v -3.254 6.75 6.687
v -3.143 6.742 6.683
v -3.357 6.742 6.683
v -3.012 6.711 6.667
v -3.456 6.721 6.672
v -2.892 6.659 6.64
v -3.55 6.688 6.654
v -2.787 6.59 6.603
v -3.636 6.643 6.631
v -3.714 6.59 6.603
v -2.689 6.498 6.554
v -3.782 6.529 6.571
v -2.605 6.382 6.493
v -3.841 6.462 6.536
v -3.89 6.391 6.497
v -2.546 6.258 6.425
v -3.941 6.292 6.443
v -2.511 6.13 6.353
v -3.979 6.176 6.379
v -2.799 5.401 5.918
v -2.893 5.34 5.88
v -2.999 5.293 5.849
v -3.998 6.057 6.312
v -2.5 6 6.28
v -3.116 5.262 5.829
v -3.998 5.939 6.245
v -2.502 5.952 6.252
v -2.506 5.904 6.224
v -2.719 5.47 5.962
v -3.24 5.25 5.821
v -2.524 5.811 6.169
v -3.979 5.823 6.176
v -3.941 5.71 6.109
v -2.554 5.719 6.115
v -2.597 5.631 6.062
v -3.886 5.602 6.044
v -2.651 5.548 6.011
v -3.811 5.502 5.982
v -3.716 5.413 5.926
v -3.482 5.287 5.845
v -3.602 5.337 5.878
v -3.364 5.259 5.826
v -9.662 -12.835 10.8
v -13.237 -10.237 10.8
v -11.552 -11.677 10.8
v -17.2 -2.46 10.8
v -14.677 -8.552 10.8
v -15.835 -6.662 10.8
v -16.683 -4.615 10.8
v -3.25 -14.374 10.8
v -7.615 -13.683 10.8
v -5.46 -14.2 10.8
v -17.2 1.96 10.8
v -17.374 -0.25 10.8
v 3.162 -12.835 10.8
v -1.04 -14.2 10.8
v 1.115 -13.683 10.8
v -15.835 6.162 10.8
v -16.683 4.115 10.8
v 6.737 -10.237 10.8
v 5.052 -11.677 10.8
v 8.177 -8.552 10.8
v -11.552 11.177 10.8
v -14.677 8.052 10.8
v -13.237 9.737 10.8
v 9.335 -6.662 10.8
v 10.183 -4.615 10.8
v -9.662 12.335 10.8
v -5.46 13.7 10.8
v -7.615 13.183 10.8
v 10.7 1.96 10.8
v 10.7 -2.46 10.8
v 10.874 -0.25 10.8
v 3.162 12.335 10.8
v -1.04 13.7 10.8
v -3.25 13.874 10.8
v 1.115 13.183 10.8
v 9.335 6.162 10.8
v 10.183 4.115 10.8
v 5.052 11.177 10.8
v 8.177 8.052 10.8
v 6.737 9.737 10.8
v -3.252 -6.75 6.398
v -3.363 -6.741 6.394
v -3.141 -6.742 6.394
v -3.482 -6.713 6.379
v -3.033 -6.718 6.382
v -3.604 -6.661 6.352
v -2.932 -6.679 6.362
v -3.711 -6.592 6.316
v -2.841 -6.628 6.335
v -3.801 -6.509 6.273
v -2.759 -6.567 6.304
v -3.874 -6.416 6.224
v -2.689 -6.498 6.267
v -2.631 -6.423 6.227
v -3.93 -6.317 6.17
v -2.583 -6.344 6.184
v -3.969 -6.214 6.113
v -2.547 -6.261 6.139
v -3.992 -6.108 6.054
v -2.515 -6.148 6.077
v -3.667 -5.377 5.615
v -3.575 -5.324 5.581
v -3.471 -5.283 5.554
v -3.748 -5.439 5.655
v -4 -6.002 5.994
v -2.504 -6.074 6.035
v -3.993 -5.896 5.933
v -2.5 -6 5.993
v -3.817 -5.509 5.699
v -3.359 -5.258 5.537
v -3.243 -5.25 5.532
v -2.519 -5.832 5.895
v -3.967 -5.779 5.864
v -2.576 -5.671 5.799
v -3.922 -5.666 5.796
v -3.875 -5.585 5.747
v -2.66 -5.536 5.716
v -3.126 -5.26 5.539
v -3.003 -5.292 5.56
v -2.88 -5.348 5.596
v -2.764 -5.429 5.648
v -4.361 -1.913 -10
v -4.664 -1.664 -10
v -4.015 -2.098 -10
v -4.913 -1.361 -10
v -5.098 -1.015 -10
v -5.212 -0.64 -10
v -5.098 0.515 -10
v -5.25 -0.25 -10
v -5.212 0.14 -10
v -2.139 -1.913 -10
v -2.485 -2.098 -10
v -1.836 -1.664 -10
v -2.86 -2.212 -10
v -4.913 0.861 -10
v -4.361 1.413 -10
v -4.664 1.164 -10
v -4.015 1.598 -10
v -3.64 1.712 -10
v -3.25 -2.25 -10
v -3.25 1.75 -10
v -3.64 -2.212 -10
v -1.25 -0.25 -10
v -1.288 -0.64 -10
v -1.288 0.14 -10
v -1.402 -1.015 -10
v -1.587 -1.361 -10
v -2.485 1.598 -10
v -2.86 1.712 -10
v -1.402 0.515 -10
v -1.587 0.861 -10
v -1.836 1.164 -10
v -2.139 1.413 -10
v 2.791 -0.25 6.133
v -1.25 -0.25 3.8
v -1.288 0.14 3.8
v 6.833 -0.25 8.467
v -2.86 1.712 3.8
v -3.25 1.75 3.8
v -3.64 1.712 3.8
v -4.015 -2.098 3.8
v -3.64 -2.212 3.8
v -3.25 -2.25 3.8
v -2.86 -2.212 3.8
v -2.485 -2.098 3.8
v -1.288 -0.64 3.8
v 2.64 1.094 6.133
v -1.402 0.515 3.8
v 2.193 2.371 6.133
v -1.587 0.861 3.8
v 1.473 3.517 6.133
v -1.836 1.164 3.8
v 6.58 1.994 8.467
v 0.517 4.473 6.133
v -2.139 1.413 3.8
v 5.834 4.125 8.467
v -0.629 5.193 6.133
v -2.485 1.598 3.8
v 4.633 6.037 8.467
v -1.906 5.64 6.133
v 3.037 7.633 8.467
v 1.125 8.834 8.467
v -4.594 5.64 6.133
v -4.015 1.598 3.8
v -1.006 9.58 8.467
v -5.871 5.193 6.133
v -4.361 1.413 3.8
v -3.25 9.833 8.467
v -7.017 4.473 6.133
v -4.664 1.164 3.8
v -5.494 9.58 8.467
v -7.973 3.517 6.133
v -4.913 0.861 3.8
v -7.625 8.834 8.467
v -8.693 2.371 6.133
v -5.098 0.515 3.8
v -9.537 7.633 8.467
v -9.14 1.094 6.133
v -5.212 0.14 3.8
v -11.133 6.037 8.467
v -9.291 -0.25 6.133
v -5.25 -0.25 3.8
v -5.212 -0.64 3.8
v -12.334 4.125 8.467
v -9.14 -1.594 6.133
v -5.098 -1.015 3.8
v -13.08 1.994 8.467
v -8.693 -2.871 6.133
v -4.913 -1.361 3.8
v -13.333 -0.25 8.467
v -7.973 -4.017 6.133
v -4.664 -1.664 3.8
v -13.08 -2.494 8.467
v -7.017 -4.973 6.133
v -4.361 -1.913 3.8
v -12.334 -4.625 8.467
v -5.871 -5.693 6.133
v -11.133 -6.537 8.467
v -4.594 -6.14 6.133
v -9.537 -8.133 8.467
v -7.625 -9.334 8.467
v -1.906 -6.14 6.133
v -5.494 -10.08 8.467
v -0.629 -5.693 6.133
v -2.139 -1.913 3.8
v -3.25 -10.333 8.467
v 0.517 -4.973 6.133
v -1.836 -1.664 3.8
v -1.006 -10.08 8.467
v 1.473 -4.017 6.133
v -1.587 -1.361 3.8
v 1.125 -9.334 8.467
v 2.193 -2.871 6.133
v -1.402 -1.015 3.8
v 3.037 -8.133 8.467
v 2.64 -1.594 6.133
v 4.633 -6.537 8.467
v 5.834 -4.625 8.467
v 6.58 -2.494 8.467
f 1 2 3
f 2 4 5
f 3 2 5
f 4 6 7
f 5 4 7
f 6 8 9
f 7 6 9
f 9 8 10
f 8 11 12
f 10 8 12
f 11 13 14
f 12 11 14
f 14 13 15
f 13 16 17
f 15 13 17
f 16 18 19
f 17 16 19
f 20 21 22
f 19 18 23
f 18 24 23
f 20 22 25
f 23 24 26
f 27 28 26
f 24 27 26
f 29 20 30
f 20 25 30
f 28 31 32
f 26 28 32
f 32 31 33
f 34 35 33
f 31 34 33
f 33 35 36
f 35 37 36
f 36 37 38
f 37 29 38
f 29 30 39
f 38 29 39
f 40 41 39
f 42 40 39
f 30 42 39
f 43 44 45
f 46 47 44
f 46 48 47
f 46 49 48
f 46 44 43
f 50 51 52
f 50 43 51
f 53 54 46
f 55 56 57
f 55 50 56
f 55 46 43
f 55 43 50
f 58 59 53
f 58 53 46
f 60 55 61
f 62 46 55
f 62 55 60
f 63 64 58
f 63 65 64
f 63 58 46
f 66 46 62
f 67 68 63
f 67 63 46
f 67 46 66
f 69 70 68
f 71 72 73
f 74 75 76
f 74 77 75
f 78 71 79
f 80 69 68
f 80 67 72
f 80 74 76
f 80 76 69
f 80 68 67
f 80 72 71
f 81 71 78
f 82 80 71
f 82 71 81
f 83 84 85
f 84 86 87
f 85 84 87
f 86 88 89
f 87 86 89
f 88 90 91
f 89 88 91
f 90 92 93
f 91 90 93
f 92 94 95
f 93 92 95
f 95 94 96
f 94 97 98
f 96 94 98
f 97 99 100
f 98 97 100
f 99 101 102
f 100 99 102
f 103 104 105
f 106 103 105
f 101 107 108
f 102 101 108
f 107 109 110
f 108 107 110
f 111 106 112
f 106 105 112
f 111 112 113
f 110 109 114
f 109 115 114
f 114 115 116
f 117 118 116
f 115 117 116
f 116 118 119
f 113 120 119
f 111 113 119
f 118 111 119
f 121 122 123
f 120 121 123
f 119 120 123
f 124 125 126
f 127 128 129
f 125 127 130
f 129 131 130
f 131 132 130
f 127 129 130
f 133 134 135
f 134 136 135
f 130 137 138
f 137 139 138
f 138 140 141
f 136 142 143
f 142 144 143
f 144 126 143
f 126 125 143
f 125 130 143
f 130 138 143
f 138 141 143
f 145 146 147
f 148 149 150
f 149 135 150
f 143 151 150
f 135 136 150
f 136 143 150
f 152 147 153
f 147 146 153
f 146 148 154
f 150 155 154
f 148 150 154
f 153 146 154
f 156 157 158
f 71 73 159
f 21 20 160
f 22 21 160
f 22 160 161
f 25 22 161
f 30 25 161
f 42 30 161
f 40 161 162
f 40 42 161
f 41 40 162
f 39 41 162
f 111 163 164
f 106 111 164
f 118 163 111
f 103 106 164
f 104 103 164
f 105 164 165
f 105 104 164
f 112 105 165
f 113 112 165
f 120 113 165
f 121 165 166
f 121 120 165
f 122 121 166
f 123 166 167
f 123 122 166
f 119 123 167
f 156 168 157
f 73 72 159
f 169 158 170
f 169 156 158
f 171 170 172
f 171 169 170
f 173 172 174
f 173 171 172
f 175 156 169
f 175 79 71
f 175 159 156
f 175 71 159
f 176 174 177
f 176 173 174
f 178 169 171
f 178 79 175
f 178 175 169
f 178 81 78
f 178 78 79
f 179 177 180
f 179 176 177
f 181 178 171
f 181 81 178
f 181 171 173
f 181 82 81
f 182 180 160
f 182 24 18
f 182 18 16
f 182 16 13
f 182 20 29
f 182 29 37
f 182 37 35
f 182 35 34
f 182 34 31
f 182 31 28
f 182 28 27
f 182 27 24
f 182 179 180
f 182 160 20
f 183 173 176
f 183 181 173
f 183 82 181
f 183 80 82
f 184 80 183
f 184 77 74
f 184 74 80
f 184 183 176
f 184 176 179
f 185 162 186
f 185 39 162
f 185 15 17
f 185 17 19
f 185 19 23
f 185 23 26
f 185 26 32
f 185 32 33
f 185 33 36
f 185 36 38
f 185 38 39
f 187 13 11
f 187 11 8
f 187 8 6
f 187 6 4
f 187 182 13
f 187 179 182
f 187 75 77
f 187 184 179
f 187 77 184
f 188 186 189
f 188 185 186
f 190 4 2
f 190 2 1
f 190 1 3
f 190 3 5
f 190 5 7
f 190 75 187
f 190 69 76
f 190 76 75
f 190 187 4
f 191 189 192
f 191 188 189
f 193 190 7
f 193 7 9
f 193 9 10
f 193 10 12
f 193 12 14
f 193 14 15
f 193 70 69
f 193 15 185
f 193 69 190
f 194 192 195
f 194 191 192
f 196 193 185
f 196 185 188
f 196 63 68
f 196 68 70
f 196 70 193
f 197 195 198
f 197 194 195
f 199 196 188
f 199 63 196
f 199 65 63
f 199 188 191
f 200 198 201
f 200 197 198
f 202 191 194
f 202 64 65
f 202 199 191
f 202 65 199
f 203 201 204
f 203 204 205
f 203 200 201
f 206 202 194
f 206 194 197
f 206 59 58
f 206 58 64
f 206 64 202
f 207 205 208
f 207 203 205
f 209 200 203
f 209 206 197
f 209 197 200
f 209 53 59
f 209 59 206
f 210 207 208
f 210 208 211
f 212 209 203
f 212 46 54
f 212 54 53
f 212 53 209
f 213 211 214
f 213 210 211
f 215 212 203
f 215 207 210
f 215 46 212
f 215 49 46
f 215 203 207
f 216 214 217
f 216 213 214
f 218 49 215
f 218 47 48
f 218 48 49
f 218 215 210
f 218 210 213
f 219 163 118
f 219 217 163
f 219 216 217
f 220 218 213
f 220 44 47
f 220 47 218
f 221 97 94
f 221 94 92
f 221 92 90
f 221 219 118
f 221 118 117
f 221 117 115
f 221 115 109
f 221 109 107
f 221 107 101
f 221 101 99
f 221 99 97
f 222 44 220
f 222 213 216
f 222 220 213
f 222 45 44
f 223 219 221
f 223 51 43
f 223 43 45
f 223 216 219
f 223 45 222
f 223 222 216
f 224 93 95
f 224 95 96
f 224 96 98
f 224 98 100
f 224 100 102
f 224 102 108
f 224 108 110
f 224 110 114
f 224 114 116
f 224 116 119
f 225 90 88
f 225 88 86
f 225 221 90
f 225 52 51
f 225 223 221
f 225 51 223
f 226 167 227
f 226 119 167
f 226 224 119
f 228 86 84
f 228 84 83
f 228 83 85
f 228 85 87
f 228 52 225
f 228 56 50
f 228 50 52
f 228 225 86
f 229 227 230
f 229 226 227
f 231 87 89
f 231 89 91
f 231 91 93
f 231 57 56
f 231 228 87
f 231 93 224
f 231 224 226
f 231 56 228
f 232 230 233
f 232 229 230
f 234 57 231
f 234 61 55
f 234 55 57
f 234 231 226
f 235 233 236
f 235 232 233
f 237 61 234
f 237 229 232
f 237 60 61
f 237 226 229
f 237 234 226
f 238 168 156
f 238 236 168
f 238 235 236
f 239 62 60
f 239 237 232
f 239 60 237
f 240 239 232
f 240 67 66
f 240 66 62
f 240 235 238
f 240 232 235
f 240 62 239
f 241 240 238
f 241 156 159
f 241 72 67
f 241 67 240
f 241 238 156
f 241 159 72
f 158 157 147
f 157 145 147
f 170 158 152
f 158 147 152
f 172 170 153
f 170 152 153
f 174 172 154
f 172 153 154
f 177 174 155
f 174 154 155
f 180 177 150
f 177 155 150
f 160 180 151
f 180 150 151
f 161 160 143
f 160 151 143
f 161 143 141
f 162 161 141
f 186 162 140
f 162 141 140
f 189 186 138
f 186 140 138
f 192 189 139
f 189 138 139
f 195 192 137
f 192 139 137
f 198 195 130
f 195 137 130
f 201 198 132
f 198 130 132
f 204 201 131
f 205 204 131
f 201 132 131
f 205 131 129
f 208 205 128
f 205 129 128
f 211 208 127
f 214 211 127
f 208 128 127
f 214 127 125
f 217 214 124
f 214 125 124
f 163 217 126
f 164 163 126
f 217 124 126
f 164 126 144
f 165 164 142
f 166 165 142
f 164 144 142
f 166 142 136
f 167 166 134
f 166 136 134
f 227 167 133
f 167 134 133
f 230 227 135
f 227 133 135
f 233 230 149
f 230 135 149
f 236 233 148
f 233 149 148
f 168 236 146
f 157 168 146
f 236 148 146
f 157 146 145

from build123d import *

# Parameters (mm, degrees)
SKETCH_W       = 12
SKETCH_H       = 17.5
PAD_DEPTH      = 1.5
PAD_DEPTH_BACK = 10
SKETCH001_R    = 0.75
PAD001_DEPTH   = 10
PAD002_DEPTH   = 5
FILLET_R       = 1
FILLET001_R    = 1
FILLET002_R    = 1
SKETCH003_W    = 5.5
SKETCH003_H    = 7
PAD003_DEPTH   = 1.8
SKETCH004_R    = 2
PAD004_DEPTH   = 0.5
SKETCH005_R    = 2
PAD005_DEPTH   = 7
PAD005_TAPER   = -60


with BuildPart() as part:
    # Sketch → Pad (new body, two sides)
    with BuildSketch(Plane.XY) as pad_sk:
        Rectangle(SKETCH_W, SKETCH_H)
    extrude(amount=PAD_DEPTH)
    extrude(pad_sk.sketch, amount=-PAD_DEPTH_BACK)

    # Sketch001 → Pad001 (join)
    with BuildSketch(Plane.XY):
        with Locations((-3.25, 6)):
            Circle(SKETCH001_R)
        with Locations((-3.25, -6)):
            Circle(SKETCH001_R)
    extrude(amount=PAD001_DEPTH)

    # Sketch002 → Pad002 (join, symmetric)
    with BuildSketch(Plane.XZ):
        with BuildLine():
            ThreePointArc((16, -10), (13.071068, -2.928932), (6, 0))
            Line((6, -10), (6, 0))
            Line((16, -10), (6, -10))
        make_face()
    extrude(amount=PAD002_DEPTH, both=True)

    # Fillet
    fillet_edges = [part.edges().sort_by_distance(p)[0] for p in [
        (6, -8.75, -4.25),
        (-6, -8.75, -4.25),
        (6, 8.75, -4.25),
        (-6, 8.75, -4.25),
    ]]
    fillet(fillet_edges, radius=FILLET_R)

    # Fillet001
    fillet001_edges = [part.edges().sort_by_distance(p)[0] for p in [
        (13.071068, -5, -2.928932),
        (13.071068, 5, -2.928932),
    ]]
    fillet(fillet001_edges, radius=FILLET001_R)

    # Fillet002
    fillet002_edges = [part.edges().sort_by_distance(p)[0] for p in [
        (6, -5, -5.5),
    ]]
    fillet(fillet002_edges, radius=FILLET002_R)

    # Sketch003 (on Face6 of Fillet002) → Pad003 (join)
    with BuildSketch(Plane.XY.offset(1.5)):
        with Locations((-3.25, 0)):
            Rectangle(SKETCH003_W, SKETCH003_H)
    extrude(amount=PAD003_DEPTH)

    # Sketch004 (on Face28 of Pad003) → Pad004 (join)
    with BuildSketch(Plane.XY.offset(3.3)):
        with Locations((-3.25, -0.25)):
            Circle(SKETCH004_R)
    extrude(amount=PAD004_DEPTH)

    # Sketch005 (on Face32 of Pad004) → Pad005 (join)
    with BuildSketch(Plane.XY.offset(3.8)):
        with Locations((-3.25, -0.25)):
            Circle(SKETCH005_R)
    extrude(amount=PAD005_DEPTH, taper=PAD005_TAPER)

    # Sketch006 (on DatumPlane) → Groove (revolve, cut)
    with BuildSketch(Plane(origin=(-3.25, -0.25, 3.8), x_dir=(1, 0, 0), z_dir=(0, -1, 0))):
        Polygon((2, 0), (2, -18), (30, -18), (30, 7), (14.124356, 7), align=None)
    revolve(axis=Axis((-3.25, -0.25, 3.8), (0, 0, 1)), mode=Mode.SUBTRACT)


solid = part.part
